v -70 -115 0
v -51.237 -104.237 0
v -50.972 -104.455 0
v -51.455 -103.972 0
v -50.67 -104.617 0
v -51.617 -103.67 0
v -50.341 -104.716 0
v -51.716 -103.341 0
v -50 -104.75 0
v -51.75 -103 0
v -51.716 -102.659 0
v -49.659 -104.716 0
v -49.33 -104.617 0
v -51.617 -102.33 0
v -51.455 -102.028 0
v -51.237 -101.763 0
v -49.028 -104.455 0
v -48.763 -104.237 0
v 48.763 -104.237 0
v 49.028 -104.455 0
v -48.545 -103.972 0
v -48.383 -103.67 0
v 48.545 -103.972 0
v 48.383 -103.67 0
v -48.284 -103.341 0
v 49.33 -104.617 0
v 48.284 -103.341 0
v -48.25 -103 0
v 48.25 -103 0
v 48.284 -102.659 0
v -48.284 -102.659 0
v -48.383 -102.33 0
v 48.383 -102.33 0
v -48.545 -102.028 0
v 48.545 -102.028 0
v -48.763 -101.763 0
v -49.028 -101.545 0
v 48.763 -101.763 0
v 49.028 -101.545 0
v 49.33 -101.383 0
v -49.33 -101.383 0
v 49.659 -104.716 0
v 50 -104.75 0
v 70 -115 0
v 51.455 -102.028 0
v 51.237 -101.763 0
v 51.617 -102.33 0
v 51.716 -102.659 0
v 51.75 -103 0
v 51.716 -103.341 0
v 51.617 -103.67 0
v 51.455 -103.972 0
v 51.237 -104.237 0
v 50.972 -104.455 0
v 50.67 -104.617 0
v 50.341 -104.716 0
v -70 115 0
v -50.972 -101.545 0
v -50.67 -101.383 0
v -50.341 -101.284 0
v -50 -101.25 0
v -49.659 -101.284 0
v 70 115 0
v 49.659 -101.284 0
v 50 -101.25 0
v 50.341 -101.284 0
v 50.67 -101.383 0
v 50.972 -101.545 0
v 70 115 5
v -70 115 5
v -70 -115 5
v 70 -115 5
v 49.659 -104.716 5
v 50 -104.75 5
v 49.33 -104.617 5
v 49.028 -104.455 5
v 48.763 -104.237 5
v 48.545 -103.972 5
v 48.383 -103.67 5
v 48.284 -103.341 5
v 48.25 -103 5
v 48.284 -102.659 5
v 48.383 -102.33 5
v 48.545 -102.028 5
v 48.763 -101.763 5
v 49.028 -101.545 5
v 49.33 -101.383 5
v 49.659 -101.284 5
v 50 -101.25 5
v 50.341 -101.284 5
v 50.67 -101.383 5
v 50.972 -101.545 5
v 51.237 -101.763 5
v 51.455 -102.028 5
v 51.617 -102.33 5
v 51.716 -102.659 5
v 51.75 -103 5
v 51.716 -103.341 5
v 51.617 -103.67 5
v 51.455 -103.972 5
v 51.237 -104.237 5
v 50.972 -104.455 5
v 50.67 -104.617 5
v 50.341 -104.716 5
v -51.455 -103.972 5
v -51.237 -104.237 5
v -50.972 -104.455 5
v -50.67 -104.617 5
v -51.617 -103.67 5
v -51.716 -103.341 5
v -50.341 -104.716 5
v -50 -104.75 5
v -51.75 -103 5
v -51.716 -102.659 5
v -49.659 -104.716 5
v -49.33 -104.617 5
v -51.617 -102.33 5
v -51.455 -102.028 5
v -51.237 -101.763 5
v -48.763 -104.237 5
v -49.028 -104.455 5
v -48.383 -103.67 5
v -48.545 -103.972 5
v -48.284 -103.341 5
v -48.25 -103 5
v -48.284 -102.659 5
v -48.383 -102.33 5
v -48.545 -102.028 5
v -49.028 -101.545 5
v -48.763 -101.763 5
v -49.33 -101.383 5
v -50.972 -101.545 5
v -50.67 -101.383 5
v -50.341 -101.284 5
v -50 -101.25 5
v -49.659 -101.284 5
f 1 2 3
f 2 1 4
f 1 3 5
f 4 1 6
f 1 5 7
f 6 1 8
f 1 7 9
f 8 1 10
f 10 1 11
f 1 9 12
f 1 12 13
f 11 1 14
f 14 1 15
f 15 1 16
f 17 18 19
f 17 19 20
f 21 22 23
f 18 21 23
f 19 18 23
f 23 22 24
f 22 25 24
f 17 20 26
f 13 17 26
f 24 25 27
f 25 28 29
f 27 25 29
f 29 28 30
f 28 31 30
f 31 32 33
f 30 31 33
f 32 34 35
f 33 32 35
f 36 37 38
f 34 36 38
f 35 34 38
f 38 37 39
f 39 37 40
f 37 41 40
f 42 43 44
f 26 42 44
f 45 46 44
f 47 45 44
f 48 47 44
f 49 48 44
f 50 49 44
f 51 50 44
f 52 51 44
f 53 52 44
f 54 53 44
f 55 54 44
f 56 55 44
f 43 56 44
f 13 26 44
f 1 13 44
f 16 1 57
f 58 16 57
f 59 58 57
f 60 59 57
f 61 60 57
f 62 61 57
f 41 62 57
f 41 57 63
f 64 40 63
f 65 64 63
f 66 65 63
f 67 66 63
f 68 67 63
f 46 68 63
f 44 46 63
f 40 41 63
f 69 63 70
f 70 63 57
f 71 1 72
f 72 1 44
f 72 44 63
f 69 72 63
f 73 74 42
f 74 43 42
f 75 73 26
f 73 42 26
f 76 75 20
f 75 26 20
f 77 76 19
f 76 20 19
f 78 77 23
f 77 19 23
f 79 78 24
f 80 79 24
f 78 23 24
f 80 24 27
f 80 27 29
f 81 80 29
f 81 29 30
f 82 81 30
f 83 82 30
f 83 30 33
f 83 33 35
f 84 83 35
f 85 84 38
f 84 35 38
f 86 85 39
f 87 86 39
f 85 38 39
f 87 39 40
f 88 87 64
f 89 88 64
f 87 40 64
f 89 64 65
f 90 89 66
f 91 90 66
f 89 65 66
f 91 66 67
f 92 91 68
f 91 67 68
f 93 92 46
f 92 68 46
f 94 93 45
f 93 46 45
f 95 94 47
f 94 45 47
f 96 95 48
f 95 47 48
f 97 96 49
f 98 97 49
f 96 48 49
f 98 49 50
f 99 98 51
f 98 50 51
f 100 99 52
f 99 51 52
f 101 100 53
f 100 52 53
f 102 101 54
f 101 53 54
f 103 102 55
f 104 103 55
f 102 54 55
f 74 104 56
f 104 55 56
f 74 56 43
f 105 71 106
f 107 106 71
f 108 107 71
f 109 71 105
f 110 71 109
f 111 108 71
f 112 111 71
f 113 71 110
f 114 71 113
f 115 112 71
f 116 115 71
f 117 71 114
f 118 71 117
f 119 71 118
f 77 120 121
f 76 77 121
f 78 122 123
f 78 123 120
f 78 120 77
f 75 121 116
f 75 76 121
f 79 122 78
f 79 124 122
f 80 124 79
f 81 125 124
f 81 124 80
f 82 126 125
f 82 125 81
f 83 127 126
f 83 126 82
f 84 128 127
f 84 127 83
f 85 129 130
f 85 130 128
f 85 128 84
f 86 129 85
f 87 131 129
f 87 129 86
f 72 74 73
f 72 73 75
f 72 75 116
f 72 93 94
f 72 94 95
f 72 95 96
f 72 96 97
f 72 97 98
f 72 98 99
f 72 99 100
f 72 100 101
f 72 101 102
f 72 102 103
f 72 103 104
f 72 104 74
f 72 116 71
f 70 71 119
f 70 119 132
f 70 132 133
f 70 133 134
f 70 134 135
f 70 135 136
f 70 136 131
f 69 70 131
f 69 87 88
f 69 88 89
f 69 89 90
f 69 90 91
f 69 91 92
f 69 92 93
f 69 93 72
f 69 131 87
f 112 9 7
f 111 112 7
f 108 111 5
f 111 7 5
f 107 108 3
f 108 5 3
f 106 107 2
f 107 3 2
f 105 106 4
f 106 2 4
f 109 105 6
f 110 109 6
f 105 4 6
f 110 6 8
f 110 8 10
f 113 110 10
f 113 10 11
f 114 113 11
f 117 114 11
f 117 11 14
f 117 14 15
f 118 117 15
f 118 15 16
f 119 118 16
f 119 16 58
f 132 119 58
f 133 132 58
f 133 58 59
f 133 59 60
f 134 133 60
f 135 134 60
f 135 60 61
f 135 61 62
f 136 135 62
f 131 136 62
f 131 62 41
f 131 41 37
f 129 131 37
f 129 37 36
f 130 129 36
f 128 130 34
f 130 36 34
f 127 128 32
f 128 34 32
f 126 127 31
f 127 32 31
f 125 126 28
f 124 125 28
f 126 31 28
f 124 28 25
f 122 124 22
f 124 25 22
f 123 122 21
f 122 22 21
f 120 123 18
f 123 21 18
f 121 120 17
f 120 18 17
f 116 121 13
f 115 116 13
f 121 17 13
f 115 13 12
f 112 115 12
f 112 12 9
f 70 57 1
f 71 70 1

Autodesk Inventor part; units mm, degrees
ref_plane "YZ Plane" through (0, 0, 0) normal (1, 0, 0) x (0, 1, 0)
ref_plane "XZ Plane" through (0, 0, 0) normal (0, 1, 0) x (-1, 0, 0)
ref_plane "XY Plane" through (0, 0, 0) normal (0, 0, 1) x (1, 0, 0)
sketch "Sketch1" plane through (0, 0, 0) normal (0, 0, 1) x (1, 0, 0)
  line L0 (-70, -115) -> (70, -115)
  line L1 (70, -115) -> (70, 115)
  line L2 (70, 115) -> (-70, 115)
  line L3 (-70, 115) -> (-70, -115)
  point P0 (0, 0)
  dimension "width" = 140
  dimension "d1" = 70
  dimension "d2" = 230
  dimension "d3" = 115
extrude "Extrusion1" add sketch "Sketch1" along normal blind 5
sketch "Sketch3" plane through (0, 0, 5) normal (0, 0, 1) x (1, 0, 0)
  line L0 (-70, 115) -> (-70, -115) projected
  line L1 (-70, -115) -> (70, -115) projected
  point P0 (0, 0)
  point P1 (-50, -103)
  point P2 (50, -103)
  dimension "d33" = 20
  dimension "d34" = 12
  dimension "d35" = 12
  dimension "d36" = 20
hole "Hole1" at (-50, -103, 5) at (50, -103, 5) direction (0, 0, -1) diameter 3.5 end through all
equation "\"d1\" = 0.5 * width"
equation "\"d3\" = 0.5 * d2"
equation "\"d35\" = d34"
equation "\"d36\" = d33"
properties part number "EBF_005.1-bottom-plate_cup-holder"
